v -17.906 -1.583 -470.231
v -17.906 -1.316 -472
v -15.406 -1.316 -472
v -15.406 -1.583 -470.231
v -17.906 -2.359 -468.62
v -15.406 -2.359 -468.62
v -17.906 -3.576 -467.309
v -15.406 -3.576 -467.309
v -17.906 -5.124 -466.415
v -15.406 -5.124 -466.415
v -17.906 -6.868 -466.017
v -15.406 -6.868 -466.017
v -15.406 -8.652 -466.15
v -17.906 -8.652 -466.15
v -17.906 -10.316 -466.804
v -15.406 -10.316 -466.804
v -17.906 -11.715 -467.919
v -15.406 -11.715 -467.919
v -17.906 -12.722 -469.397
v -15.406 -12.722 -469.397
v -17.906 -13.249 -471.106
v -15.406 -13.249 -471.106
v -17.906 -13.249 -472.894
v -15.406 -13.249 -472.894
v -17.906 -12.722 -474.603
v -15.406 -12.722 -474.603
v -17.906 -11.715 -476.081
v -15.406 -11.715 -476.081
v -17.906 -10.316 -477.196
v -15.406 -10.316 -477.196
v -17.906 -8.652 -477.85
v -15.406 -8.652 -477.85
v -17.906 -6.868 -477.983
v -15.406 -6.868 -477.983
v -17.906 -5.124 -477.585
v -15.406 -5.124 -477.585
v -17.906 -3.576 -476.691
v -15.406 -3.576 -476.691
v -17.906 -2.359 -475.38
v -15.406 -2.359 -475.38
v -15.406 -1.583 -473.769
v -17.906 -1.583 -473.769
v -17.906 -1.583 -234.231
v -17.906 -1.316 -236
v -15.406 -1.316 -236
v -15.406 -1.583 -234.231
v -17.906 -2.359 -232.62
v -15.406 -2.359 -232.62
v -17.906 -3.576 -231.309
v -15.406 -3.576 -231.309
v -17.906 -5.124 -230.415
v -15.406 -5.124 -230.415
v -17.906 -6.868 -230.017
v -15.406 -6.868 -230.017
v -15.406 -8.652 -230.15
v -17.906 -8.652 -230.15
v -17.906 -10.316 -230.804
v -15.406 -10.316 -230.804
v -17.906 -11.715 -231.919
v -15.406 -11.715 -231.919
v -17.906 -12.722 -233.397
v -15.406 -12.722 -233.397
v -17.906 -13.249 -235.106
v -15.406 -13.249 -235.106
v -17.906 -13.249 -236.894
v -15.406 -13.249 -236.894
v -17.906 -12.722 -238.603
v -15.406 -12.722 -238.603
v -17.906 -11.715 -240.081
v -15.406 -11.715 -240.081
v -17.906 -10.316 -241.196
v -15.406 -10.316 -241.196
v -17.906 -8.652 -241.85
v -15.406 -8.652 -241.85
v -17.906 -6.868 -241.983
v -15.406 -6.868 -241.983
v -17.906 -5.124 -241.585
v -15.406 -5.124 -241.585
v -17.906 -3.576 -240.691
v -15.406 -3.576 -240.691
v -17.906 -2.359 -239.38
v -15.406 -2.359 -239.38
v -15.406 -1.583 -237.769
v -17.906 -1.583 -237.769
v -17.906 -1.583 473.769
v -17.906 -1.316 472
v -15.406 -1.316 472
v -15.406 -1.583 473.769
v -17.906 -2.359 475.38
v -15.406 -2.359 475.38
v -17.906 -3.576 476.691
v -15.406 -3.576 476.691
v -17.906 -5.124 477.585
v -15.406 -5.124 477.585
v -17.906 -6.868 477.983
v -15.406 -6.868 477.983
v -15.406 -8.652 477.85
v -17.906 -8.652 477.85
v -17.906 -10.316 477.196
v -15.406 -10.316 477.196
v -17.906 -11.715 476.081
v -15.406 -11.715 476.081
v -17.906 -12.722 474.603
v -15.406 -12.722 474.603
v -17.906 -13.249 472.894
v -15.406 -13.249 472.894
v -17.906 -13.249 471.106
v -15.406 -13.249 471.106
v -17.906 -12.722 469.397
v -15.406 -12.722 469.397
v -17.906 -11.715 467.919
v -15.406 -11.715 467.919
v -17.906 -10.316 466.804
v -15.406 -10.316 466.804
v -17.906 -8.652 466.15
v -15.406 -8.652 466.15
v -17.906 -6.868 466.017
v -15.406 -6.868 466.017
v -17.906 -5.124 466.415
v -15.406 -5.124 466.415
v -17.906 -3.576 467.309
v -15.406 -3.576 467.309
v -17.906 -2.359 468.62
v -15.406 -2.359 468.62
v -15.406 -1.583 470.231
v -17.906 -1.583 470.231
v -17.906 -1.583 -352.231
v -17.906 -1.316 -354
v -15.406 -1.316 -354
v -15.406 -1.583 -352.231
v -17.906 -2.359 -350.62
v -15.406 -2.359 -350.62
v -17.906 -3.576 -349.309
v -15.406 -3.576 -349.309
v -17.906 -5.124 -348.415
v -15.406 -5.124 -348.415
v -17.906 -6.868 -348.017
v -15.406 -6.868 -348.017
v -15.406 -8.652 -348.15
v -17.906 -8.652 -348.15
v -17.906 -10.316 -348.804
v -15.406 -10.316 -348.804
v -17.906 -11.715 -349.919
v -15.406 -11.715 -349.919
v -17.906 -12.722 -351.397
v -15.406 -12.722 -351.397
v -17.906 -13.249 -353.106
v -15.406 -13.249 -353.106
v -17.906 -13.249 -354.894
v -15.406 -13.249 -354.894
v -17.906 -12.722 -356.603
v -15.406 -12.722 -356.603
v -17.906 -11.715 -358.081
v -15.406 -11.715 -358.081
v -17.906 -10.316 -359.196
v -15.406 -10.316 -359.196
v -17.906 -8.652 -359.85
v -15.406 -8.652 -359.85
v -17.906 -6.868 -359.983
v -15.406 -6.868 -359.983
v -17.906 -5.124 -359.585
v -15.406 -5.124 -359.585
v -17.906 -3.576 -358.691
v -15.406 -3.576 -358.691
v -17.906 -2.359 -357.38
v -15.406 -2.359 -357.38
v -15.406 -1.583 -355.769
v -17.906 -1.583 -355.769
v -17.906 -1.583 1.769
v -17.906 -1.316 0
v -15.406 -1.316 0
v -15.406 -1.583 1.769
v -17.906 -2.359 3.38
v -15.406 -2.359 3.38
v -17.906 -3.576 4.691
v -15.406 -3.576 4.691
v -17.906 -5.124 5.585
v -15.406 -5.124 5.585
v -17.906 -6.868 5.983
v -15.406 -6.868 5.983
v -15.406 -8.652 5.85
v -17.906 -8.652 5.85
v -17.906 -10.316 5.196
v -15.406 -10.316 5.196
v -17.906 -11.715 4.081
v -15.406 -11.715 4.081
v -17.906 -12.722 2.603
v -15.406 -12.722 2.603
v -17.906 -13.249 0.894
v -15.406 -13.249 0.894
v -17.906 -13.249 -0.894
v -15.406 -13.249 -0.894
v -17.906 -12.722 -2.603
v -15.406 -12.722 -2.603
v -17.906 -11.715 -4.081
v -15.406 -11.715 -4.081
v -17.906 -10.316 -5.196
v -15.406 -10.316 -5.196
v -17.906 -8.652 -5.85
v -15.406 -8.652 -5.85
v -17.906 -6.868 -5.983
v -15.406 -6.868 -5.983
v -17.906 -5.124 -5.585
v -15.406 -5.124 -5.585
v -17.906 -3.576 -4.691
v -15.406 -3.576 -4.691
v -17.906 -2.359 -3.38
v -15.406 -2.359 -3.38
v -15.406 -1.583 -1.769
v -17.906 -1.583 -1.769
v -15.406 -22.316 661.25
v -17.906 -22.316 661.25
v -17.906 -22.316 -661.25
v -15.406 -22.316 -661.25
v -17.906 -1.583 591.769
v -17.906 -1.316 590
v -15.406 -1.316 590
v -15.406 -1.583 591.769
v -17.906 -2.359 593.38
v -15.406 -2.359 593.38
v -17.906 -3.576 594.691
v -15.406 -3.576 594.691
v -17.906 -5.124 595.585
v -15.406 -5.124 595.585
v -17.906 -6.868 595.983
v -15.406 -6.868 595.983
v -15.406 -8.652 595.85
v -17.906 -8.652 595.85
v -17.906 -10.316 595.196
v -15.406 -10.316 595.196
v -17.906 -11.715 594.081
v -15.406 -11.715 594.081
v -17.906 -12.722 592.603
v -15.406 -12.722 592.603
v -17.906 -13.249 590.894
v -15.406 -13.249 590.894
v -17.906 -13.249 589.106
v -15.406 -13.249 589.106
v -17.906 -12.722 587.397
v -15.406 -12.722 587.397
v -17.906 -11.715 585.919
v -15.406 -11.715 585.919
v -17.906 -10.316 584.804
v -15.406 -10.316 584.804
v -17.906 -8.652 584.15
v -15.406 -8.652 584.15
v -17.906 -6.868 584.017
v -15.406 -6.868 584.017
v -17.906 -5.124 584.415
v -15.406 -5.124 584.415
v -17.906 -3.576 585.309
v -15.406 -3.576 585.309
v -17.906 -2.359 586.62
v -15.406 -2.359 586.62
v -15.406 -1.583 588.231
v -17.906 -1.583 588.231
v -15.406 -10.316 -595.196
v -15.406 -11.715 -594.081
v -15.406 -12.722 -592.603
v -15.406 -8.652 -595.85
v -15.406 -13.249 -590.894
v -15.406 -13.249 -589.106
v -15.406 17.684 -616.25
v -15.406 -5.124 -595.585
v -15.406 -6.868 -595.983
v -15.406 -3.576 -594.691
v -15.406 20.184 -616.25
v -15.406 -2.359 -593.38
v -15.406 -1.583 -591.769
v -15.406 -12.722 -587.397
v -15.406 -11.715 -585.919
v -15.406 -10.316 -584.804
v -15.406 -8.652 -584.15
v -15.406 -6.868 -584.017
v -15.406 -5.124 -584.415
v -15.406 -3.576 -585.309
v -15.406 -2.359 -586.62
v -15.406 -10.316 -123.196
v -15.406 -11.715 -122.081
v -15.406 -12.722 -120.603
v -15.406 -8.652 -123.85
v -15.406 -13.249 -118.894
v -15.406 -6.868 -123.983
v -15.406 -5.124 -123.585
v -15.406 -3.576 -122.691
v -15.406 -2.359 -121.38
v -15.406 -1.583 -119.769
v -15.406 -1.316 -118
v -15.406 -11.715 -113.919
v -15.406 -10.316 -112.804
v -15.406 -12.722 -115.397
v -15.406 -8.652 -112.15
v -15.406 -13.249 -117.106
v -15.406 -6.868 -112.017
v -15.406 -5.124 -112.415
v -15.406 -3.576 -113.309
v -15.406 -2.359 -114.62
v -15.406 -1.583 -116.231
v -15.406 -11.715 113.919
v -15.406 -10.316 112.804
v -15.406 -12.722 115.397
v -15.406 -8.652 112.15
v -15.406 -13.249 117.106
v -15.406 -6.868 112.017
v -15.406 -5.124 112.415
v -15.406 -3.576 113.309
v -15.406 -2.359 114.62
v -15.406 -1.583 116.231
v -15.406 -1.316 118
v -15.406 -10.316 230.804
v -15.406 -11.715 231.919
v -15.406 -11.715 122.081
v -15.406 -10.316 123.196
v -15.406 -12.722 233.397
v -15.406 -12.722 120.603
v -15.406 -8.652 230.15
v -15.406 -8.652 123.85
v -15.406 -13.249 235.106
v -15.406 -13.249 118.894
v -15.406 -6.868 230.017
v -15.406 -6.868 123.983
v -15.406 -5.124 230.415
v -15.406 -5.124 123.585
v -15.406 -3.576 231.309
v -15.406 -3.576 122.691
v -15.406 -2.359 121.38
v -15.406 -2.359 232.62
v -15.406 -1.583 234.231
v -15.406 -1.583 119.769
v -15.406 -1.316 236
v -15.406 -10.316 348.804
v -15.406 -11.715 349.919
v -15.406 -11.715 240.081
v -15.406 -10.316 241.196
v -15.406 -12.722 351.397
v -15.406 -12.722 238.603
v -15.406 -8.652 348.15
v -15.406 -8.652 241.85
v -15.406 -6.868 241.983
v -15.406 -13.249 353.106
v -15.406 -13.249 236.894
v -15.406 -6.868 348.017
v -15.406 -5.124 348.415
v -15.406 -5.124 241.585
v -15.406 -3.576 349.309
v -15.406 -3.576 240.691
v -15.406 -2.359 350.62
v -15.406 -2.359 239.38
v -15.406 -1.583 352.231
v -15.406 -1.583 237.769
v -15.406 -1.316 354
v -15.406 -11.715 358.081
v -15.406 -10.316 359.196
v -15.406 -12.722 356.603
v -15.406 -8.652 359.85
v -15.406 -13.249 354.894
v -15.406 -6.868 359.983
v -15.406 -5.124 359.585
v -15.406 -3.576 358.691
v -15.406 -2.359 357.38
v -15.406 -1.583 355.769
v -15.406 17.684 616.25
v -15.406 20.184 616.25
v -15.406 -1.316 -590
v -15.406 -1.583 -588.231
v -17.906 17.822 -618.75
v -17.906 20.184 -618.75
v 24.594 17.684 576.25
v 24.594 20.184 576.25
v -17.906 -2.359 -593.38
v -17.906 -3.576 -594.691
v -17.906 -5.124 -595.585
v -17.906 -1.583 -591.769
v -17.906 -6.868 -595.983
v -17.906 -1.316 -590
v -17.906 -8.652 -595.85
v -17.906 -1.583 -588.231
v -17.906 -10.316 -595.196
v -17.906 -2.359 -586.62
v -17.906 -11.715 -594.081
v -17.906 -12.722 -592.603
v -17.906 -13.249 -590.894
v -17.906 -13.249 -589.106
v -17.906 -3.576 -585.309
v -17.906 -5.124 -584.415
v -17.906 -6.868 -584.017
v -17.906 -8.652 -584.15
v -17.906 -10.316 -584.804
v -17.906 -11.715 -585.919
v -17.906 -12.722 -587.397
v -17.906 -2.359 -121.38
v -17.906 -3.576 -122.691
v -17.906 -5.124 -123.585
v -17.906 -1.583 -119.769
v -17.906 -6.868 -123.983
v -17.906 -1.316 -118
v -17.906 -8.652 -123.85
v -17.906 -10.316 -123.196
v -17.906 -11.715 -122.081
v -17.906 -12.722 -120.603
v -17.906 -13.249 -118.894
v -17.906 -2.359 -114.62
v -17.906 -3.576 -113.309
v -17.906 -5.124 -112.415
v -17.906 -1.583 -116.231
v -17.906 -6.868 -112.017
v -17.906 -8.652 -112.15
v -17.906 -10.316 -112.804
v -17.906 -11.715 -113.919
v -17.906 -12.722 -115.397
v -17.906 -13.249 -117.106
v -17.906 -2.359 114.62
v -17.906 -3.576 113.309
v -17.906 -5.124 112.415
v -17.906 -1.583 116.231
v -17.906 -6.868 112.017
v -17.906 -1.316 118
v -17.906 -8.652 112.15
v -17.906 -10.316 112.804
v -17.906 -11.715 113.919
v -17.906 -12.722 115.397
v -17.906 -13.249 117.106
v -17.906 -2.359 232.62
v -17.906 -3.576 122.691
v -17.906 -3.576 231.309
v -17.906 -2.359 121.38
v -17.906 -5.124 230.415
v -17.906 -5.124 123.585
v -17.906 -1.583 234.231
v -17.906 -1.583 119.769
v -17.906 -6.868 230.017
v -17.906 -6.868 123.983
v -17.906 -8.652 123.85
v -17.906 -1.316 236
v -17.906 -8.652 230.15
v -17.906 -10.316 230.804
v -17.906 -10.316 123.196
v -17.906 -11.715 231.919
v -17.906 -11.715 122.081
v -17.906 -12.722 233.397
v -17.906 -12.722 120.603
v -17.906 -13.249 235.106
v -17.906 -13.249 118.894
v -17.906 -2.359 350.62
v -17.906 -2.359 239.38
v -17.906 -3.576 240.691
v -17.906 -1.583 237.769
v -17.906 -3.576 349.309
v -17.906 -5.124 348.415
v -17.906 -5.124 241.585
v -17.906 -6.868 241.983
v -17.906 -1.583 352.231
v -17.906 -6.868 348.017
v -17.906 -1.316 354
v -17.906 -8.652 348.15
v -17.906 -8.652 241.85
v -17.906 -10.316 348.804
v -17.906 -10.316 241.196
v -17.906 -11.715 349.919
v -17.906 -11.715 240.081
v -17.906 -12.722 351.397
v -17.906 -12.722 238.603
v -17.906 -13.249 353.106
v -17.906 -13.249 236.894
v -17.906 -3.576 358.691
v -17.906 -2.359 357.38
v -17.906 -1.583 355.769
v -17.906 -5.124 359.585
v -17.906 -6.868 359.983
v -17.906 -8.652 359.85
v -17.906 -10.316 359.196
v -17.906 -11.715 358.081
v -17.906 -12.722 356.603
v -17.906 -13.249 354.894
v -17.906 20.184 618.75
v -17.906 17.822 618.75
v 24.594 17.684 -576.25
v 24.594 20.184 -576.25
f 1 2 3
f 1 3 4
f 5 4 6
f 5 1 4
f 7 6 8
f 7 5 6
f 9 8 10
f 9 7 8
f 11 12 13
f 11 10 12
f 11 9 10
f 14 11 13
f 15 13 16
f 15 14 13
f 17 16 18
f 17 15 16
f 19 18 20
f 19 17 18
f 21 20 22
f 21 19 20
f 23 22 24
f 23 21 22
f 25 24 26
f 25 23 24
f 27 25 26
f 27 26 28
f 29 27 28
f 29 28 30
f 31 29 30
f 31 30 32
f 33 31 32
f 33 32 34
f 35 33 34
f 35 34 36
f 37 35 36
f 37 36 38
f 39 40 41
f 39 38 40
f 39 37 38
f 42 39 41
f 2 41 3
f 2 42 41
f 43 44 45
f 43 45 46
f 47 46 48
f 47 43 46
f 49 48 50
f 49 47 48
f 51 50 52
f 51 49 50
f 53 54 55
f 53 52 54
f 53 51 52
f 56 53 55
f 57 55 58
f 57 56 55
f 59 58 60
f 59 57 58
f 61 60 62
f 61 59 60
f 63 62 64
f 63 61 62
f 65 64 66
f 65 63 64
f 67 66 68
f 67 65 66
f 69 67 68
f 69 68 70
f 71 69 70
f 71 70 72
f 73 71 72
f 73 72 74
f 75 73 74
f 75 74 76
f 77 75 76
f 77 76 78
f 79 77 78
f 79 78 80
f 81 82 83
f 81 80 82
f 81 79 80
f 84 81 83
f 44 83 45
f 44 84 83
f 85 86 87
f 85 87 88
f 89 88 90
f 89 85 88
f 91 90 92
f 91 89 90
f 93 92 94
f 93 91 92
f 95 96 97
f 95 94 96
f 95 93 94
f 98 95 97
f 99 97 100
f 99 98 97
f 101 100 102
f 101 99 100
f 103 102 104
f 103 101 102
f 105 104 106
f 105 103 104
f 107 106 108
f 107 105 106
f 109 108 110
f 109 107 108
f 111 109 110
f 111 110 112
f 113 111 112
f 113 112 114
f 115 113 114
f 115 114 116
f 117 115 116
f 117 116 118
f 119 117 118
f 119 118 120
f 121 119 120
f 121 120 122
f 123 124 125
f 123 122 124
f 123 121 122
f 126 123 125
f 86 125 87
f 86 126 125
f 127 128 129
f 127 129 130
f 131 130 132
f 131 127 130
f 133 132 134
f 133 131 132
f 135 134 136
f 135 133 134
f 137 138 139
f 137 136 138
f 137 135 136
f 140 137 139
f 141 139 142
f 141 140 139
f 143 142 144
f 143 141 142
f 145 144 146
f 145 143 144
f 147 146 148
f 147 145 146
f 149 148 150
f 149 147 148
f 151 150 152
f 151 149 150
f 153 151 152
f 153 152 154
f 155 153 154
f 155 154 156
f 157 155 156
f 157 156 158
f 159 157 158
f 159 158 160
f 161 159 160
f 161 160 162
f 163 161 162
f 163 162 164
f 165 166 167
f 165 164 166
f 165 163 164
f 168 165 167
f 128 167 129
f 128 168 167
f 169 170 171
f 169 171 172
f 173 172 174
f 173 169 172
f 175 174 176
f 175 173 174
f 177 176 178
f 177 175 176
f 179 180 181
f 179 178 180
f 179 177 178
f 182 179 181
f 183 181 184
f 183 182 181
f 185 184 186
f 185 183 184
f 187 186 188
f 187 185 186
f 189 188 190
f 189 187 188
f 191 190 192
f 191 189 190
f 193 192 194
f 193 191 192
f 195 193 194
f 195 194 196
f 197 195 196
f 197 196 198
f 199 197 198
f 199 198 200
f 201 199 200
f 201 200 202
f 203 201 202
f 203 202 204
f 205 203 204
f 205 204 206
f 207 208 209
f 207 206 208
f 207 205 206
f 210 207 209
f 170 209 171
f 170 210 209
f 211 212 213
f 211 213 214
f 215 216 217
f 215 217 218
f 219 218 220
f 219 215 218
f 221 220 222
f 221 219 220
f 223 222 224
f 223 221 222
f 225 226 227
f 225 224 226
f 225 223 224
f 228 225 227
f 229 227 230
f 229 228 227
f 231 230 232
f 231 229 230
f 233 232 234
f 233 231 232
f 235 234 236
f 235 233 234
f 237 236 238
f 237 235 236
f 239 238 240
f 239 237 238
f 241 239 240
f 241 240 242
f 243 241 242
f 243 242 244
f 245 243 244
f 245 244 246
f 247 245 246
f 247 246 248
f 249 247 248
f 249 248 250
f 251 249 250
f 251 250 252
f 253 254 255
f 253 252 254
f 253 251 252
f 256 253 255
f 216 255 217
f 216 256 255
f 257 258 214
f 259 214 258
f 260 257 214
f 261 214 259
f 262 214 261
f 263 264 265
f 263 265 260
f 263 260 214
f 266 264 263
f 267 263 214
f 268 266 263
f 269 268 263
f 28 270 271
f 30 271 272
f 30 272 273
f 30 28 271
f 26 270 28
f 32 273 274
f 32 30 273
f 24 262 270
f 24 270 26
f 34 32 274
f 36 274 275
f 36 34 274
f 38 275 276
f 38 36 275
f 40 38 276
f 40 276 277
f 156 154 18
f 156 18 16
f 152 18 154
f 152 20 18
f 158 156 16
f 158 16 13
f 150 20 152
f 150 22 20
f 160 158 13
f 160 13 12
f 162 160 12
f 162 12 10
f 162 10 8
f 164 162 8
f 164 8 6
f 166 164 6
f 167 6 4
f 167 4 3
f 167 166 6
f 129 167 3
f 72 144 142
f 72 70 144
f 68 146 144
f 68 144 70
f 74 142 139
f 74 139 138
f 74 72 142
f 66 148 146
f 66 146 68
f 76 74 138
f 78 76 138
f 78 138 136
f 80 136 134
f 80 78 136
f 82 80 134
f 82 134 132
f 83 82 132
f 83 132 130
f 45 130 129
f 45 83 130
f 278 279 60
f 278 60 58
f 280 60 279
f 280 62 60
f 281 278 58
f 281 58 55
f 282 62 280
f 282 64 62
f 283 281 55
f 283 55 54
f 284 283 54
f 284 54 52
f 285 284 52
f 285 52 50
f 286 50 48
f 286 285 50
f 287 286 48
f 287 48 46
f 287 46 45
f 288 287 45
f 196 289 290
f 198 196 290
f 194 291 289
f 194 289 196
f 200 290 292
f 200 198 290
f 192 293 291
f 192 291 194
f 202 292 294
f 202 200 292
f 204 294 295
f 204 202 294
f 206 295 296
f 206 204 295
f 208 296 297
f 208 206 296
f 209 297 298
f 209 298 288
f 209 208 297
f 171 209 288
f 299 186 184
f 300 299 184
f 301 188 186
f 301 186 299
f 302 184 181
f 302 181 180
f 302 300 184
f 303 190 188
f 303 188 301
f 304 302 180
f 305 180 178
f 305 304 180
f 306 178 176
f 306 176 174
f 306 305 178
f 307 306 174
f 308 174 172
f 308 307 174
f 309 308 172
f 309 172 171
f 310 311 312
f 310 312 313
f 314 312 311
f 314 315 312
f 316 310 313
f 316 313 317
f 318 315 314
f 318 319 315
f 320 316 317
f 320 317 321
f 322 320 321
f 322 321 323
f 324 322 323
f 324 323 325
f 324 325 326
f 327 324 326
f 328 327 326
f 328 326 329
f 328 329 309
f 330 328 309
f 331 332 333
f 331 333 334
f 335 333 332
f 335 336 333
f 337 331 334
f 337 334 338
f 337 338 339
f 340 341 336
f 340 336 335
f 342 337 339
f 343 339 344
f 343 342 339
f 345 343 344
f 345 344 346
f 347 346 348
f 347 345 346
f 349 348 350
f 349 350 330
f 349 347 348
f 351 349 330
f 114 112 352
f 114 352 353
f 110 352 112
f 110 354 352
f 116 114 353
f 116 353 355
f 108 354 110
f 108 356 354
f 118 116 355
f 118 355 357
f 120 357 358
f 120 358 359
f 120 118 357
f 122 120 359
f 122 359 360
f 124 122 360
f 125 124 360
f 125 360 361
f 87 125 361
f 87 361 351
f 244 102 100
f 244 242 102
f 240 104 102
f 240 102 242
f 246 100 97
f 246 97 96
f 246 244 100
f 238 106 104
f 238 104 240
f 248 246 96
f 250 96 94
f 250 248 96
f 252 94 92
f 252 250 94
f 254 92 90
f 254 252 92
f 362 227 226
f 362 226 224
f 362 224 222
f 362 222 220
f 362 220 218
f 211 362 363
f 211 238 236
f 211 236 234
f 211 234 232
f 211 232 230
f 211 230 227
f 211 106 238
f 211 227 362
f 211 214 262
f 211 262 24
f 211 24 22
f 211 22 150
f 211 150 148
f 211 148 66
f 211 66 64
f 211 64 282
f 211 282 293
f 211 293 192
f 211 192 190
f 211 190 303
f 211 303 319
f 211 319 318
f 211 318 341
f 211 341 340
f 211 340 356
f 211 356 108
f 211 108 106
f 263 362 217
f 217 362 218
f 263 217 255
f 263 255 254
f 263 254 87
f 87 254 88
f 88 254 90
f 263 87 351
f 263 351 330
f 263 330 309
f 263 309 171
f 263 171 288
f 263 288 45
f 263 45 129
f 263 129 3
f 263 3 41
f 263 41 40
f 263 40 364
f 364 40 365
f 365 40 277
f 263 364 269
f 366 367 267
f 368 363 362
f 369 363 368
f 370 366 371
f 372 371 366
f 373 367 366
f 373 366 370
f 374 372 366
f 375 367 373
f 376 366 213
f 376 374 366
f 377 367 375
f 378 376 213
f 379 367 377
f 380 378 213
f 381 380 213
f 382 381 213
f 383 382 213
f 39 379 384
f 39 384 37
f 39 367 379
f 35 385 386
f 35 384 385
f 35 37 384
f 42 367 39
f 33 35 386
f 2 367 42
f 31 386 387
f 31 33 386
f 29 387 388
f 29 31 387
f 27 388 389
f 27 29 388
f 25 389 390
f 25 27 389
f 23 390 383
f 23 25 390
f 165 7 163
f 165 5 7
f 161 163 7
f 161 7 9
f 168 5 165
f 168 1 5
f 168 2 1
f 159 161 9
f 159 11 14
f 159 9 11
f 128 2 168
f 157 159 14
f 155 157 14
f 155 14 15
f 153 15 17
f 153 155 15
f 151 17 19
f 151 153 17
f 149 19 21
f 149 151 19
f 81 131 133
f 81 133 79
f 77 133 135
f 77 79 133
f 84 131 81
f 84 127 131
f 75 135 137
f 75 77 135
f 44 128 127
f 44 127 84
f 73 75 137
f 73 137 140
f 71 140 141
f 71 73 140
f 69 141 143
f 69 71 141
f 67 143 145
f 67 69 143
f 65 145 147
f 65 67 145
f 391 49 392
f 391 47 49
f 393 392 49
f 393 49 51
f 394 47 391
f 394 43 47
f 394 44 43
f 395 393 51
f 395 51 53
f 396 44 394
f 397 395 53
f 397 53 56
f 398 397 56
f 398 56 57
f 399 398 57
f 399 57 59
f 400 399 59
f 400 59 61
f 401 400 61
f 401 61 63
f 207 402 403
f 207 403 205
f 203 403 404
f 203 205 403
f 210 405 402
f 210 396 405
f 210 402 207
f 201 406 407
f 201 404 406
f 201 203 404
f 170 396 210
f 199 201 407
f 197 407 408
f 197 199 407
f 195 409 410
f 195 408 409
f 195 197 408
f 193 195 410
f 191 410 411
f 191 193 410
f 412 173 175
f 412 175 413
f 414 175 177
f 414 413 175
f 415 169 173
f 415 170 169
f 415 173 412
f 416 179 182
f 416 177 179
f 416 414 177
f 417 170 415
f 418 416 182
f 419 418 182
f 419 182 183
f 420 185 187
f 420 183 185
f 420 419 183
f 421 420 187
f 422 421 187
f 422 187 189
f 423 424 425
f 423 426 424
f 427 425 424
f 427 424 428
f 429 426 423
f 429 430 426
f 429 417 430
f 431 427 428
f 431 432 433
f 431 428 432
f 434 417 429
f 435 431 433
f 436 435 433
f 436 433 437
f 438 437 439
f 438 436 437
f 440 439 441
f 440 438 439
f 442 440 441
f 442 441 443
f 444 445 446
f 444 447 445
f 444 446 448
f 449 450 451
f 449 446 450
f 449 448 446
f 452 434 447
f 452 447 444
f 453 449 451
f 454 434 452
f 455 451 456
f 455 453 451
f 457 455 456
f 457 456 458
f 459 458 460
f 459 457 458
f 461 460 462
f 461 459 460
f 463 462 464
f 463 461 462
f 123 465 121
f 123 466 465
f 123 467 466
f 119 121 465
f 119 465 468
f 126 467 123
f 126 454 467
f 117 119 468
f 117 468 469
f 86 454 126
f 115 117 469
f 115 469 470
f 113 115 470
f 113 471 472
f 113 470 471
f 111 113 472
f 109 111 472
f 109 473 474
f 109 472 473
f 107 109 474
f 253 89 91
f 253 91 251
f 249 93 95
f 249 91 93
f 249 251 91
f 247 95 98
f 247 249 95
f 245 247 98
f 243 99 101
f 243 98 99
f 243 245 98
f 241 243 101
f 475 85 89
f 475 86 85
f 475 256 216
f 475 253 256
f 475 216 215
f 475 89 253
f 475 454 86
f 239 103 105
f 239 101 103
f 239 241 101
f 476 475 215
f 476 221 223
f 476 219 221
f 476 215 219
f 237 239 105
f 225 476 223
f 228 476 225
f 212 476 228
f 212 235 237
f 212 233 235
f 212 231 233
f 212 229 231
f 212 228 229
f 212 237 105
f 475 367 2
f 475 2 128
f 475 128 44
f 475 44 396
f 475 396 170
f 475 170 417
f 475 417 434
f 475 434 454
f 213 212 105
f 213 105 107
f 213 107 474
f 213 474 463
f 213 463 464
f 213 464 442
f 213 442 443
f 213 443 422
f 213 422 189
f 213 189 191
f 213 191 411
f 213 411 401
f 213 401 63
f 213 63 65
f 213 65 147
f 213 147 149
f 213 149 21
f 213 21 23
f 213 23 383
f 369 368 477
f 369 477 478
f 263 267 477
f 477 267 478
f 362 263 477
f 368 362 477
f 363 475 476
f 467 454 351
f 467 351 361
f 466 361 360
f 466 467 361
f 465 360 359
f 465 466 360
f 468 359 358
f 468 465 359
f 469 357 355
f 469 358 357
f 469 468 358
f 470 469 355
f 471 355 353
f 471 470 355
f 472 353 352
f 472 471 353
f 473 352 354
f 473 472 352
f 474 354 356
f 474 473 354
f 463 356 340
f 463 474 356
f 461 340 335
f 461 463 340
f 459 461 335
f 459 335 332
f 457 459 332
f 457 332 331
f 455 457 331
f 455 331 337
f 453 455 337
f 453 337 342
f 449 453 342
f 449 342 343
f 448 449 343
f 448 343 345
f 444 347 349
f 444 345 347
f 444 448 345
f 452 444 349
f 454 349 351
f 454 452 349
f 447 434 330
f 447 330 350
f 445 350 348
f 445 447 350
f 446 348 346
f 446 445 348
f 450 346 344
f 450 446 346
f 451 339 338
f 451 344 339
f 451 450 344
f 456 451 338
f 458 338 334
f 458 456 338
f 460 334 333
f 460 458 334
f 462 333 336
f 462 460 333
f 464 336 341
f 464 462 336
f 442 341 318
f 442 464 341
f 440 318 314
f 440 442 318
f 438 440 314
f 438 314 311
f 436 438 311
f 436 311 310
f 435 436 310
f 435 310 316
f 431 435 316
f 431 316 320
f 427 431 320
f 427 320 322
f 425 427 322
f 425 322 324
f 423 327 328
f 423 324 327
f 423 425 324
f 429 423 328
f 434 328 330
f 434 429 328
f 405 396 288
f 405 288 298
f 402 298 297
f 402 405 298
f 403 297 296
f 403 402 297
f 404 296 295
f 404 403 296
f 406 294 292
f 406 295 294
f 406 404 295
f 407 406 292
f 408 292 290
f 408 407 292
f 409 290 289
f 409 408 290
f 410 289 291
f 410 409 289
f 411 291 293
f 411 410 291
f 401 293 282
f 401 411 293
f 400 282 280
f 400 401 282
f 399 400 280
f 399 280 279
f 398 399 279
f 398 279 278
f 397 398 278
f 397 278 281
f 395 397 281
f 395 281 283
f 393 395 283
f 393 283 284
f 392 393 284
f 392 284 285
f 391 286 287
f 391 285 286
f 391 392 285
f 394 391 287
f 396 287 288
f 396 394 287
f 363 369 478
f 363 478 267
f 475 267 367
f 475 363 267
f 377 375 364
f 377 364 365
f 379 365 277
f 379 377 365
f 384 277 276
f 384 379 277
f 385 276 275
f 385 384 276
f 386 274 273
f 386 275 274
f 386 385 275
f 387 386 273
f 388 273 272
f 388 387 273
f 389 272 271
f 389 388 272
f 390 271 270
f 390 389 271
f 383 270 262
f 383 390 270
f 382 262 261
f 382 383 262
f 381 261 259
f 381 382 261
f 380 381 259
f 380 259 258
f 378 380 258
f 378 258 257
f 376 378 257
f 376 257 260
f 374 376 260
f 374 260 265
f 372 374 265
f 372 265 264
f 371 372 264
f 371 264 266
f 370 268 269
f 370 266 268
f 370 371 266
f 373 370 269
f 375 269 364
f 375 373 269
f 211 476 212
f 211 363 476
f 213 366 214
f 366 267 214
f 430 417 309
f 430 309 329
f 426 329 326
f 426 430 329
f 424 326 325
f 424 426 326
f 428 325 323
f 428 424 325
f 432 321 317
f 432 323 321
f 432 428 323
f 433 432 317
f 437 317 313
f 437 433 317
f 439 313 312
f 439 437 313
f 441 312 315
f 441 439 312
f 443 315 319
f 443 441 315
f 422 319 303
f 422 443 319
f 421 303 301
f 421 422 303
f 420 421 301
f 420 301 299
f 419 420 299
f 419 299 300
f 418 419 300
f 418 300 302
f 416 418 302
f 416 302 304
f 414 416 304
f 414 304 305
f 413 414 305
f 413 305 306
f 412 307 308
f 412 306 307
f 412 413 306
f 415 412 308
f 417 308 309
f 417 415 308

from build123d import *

# Parameters (mm, degrees)
BOSS_EXTRUDE1_DEPTH     = 618.75
CUT_EXTRUDE1_DEPTH      = 10
BOSS_EXTRUDE5_DEPTH     = 2.5
CUT_EXTRUDE2_DEPTH      = 663.834510593
CUT_EXTRUDE2_DEPTH_BACK = 663.834510593
SKETCH5_R               = 6


with BuildPart() as part:
    # Sketch1 → Boss-Extrude1 (new, symmetric)
    with BuildSketch(Plane.XY):
        Polygon((-17.90633676, 20.183505355), (-17.90633676, -22.316494645), (-15.40633676, -22.316494645), (-15.40633676, 17.683505355), (24.59366324, 17.683505355), (24.59366324, 20.183505355), align=None)
    extrude(amount=BOSS_EXTRUDE1_DEPTH, both=True)

    # Sketch2 → Cut-Extrude1 (cut)
    with BuildSketch(Plane(origin=(0, 20.183505355, 0), x_dir=(1, 0, 0), z_dir=(0, 1, 0))):
        Polygon((-17.90633676, 618.75), (24.59366324, 576.25), (24.59366324, 618.75), align=None)
        Polygon((24.59366324, -576.25), (24.59366324, -618.75), (-17.90633676, -618.75), align=None)
    extrude(amount=-CUT_EXTRUDE1_DEPTH, mode=Mode.SUBTRACT)

    # Sketch3 → Boss-Extrude5 (add)
    with BuildSketch(Plane(origin=(-15.40633676, 0, 0), x_dir=(0, 0, -1), z_dir=(1, 0, 0))):
        Polygon((-616.25, 20.183505355), (-661.25, -22.316494645), (-616.25, -22.316494645), align=None)
        Polygon((616.25, 20.183505355), (661.25, -22.316494645), (616.25, -22.316494645), align=None)
    extrude(amount=-BOSS_EXTRUDE5_DEPTH)

    # Sketch5 → Cut-Extrude2 (cut, two sides: drawn at the far end of the back side and taken through both)
    with BuildSketch(Plane(origin=(-15.40633676, 0, 0), x_dir=(0, 0, -1), z_dir=(1, 0, 0)).offset(-CUT_EXTRUDE2_DEPTH_BACK)):
        with Locations(Location((-590, -7.316494645, 0), (0, 0, 90))):
            Circle(SKETCH5_R)
        with Locations(Location((-472, -7.316494645, 0), (0, 0, 90))):
            Circle(SKETCH5_R)
        with Locations(Location((-354, -7.316494645, 0), (0, 0, 90))):
            Circle(SKETCH5_R)
        with Locations(Location((-236, -7.316494645, 0), (0, 0, 90))):
            Circle(SKETCH5_R)
        with Locations(Location((-118, -7.316494645, 0), (0, 0, 90))):
            Circle(SKETCH5_R)
        with Locations(Location((0, -7.316494645, 0), (0, 0, 90))):
            Circle(SKETCH5_R)
        with Locations(Location((118, -7.316494645, 0), (0, 0, 90))):
            Circle(SKETCH5_R)
        with Locations(Location((236, -7.316494645, 0), (0, 0, 90))):
            Circle(SKETCH5_R)
        with Locations(Location((354, -7.316494645, 0), (0, 0, 90))):
            Circle(SKETCH5_R)
        with Locations(Location((472, -7.316494645, 0), (0, 0, 90))):
            Circle(SKETCH5_R)
        with Locations(Location((590, -7.316494645, 0), (0, 0, 90))):
            Circle(SKETCH5_R)
    extrude(amount=CUT_EXTRUDE2_DEPTH + CUT_EXTRUDE2_DEPTH_BACK, mode=Mode.SUBTRACT)


solid = part.part
